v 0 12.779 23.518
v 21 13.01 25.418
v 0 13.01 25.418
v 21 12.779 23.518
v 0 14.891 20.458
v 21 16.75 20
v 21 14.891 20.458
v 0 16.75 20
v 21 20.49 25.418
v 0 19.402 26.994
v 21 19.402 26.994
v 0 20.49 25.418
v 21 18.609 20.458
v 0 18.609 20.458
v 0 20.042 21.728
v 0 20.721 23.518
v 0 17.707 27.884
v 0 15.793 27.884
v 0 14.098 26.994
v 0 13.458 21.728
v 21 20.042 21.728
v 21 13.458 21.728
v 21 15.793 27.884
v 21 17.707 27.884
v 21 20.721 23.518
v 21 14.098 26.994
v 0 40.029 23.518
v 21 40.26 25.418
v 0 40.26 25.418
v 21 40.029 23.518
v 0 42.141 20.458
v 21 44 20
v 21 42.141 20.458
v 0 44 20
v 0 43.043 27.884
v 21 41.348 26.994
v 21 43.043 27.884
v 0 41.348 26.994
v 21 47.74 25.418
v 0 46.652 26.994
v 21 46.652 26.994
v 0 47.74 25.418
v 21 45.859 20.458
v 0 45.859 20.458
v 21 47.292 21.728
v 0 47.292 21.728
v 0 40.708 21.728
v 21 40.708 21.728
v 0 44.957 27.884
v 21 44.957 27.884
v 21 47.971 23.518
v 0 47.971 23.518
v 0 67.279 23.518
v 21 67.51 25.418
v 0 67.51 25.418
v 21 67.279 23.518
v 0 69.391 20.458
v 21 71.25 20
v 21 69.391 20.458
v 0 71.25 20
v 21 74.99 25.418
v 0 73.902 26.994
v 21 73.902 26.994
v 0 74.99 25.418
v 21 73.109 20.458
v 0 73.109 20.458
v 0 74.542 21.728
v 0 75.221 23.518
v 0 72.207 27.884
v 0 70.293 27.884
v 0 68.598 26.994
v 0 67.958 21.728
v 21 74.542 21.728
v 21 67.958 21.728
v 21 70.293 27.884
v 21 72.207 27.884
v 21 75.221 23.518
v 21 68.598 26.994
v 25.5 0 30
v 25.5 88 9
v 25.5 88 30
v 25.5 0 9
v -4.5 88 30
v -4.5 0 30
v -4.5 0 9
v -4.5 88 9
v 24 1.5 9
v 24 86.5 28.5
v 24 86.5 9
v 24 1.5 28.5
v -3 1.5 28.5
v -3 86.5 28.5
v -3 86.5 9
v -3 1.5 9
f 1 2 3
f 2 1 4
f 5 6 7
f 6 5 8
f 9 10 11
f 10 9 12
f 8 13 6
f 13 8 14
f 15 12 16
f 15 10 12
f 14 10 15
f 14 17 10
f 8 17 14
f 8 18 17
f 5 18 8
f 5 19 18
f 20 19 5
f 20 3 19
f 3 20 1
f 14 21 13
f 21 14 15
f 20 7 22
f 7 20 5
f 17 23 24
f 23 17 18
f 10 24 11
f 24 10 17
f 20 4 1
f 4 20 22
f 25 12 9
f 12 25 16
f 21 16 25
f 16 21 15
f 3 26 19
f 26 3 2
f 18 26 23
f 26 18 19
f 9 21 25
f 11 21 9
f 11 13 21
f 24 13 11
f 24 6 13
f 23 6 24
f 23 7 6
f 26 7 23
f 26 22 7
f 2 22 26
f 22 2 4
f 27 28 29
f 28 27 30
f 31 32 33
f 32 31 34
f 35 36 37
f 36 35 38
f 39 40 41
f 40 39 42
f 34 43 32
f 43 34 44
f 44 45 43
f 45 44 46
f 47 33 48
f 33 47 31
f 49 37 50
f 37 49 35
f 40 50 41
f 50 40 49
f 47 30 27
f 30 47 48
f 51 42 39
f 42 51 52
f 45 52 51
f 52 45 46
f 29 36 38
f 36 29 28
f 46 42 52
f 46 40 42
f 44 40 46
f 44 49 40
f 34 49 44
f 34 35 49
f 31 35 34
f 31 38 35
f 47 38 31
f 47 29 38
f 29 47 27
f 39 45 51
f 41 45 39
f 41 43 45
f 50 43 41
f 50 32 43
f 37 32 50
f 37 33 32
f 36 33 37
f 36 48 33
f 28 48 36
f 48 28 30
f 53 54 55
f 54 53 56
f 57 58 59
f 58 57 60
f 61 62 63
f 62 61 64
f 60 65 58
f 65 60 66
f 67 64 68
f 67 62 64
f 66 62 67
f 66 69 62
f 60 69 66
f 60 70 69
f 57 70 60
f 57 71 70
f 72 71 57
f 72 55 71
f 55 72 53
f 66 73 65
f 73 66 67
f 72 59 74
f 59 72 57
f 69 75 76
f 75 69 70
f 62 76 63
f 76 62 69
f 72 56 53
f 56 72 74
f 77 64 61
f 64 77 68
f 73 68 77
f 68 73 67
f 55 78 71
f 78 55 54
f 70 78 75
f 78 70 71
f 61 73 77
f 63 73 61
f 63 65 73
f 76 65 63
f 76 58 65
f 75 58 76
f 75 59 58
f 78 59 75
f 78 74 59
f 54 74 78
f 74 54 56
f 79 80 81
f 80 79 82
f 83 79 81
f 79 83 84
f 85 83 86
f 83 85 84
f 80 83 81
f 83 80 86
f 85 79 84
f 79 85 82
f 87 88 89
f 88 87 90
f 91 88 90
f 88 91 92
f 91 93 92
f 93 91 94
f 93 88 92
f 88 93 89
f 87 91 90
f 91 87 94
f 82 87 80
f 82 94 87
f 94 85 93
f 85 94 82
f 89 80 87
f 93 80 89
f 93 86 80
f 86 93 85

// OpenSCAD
module triplicate(){
     space = (100-12-21*3)/4;
    translate([0, space+10.5, 0]){
    translate([0, 0, 0])
        children();
    
    translate([0, 21+space, 0])
        children();

    translate([0, (21+space)*2, 0])
        children();
    }
}


module cooler(){
    translate([0,-21/2, 0]){
        color([0.5, 0.5, 0.5])
           cube([21, 21, 15]);
    }
}

module board(){
    //Subtract 12 to approximate usable board area
    cube([35, 100-12, 1]);
}

module quadCyl(sx, sy, sz, r){
    x = sx;
    y = sy;
    

    translate([x, y, 0])
        cylinder(sz, r, r);
    translate([x, -y, 0])
        cylinder(sz, r, r);
    translate([-x, y, 0])
        cylinder(sz, r, r);
    translate([-x, -y, 0])
        cylinder(sz, r, r);

}


module roundedPlate(sx, sy, sz, r){
    x = sx/2-r;
    y = sy/2-r;
    
    hull(){
        quadCyl(x, y, sz, r);
    }
}

module hollowCube(vo, wt){
    difference(){
        cube(vo);
        translate(wt*0.5)
        cube(vo-wt);
        
    }
}

module fanBody(){
    difference(){
        union(){
            roundedPlate(30, 30, 3, 3);
        
            translate([0,0,3])
                rotate([0,0,360/16])
                    cylinder(7, 16, 16, $fn=8);
            quadCyl(12,12,10,3);
        }
        translate([0, 0, -1])
            cylinder(15, 14.5, 14.5);
    }
}

module fanHoles(r, l){
           quadCyl(12,12,l,r);
}
module fan(){
    color([0,0,0])
        difference(){
            fanBody();
            translate([0, 0, -1]){
                fanHoles(1.5, 15);
            }
        }
        //cube([30, 30, 11]);
}

module coolers(){
    triplicate()
        cooler();
    
}

module to220term(){
    color([0.5, 0.5, 0.5])
        translate([-14, 0, 0])
            cube([14, 1, 0.5]);
}

module to220(){
    color([0.5, 0.5, 0.5])
    cube([15.5, 10.5, 1]);
    color([0, 0, 0])
    translate([0,0,1])
    cube([9, 10.5, 3]);
    translate([0,-0.3, 0]){
        translate([0, 2, 2])
            to220term();
        translate([0, 5, 2])
            to220term();
        translate([0, 8, 2])
            to220term();
    }
}

module to220c(){
    translate([20,0,5])
        translate([0, -10.5/2, 0])
            rotate([180,0,-180])
                to220();
}


module regulators(){
    triplicate()
        to220c();
}

module duct(){
    triplicate()
    translate([0,0,24])
        rotate([0,90,0])
            cylinder(21, 4, 4);
    translate([-9/2, 0, 0])
    hollowCube([30, 88, 30], [3,3,3]);
}

module halfDuct(){
    difference(){
        duct();
        translate([-10, -10, -1])
            cube([100, 100, 10]);
    }
}

module componentsAssembly(){
regulators();
translate([0,0,5])
coolers();
board();
translate([21/2,88/2,30])
fan();
}
halfDuct();
//componentsAssembly();
